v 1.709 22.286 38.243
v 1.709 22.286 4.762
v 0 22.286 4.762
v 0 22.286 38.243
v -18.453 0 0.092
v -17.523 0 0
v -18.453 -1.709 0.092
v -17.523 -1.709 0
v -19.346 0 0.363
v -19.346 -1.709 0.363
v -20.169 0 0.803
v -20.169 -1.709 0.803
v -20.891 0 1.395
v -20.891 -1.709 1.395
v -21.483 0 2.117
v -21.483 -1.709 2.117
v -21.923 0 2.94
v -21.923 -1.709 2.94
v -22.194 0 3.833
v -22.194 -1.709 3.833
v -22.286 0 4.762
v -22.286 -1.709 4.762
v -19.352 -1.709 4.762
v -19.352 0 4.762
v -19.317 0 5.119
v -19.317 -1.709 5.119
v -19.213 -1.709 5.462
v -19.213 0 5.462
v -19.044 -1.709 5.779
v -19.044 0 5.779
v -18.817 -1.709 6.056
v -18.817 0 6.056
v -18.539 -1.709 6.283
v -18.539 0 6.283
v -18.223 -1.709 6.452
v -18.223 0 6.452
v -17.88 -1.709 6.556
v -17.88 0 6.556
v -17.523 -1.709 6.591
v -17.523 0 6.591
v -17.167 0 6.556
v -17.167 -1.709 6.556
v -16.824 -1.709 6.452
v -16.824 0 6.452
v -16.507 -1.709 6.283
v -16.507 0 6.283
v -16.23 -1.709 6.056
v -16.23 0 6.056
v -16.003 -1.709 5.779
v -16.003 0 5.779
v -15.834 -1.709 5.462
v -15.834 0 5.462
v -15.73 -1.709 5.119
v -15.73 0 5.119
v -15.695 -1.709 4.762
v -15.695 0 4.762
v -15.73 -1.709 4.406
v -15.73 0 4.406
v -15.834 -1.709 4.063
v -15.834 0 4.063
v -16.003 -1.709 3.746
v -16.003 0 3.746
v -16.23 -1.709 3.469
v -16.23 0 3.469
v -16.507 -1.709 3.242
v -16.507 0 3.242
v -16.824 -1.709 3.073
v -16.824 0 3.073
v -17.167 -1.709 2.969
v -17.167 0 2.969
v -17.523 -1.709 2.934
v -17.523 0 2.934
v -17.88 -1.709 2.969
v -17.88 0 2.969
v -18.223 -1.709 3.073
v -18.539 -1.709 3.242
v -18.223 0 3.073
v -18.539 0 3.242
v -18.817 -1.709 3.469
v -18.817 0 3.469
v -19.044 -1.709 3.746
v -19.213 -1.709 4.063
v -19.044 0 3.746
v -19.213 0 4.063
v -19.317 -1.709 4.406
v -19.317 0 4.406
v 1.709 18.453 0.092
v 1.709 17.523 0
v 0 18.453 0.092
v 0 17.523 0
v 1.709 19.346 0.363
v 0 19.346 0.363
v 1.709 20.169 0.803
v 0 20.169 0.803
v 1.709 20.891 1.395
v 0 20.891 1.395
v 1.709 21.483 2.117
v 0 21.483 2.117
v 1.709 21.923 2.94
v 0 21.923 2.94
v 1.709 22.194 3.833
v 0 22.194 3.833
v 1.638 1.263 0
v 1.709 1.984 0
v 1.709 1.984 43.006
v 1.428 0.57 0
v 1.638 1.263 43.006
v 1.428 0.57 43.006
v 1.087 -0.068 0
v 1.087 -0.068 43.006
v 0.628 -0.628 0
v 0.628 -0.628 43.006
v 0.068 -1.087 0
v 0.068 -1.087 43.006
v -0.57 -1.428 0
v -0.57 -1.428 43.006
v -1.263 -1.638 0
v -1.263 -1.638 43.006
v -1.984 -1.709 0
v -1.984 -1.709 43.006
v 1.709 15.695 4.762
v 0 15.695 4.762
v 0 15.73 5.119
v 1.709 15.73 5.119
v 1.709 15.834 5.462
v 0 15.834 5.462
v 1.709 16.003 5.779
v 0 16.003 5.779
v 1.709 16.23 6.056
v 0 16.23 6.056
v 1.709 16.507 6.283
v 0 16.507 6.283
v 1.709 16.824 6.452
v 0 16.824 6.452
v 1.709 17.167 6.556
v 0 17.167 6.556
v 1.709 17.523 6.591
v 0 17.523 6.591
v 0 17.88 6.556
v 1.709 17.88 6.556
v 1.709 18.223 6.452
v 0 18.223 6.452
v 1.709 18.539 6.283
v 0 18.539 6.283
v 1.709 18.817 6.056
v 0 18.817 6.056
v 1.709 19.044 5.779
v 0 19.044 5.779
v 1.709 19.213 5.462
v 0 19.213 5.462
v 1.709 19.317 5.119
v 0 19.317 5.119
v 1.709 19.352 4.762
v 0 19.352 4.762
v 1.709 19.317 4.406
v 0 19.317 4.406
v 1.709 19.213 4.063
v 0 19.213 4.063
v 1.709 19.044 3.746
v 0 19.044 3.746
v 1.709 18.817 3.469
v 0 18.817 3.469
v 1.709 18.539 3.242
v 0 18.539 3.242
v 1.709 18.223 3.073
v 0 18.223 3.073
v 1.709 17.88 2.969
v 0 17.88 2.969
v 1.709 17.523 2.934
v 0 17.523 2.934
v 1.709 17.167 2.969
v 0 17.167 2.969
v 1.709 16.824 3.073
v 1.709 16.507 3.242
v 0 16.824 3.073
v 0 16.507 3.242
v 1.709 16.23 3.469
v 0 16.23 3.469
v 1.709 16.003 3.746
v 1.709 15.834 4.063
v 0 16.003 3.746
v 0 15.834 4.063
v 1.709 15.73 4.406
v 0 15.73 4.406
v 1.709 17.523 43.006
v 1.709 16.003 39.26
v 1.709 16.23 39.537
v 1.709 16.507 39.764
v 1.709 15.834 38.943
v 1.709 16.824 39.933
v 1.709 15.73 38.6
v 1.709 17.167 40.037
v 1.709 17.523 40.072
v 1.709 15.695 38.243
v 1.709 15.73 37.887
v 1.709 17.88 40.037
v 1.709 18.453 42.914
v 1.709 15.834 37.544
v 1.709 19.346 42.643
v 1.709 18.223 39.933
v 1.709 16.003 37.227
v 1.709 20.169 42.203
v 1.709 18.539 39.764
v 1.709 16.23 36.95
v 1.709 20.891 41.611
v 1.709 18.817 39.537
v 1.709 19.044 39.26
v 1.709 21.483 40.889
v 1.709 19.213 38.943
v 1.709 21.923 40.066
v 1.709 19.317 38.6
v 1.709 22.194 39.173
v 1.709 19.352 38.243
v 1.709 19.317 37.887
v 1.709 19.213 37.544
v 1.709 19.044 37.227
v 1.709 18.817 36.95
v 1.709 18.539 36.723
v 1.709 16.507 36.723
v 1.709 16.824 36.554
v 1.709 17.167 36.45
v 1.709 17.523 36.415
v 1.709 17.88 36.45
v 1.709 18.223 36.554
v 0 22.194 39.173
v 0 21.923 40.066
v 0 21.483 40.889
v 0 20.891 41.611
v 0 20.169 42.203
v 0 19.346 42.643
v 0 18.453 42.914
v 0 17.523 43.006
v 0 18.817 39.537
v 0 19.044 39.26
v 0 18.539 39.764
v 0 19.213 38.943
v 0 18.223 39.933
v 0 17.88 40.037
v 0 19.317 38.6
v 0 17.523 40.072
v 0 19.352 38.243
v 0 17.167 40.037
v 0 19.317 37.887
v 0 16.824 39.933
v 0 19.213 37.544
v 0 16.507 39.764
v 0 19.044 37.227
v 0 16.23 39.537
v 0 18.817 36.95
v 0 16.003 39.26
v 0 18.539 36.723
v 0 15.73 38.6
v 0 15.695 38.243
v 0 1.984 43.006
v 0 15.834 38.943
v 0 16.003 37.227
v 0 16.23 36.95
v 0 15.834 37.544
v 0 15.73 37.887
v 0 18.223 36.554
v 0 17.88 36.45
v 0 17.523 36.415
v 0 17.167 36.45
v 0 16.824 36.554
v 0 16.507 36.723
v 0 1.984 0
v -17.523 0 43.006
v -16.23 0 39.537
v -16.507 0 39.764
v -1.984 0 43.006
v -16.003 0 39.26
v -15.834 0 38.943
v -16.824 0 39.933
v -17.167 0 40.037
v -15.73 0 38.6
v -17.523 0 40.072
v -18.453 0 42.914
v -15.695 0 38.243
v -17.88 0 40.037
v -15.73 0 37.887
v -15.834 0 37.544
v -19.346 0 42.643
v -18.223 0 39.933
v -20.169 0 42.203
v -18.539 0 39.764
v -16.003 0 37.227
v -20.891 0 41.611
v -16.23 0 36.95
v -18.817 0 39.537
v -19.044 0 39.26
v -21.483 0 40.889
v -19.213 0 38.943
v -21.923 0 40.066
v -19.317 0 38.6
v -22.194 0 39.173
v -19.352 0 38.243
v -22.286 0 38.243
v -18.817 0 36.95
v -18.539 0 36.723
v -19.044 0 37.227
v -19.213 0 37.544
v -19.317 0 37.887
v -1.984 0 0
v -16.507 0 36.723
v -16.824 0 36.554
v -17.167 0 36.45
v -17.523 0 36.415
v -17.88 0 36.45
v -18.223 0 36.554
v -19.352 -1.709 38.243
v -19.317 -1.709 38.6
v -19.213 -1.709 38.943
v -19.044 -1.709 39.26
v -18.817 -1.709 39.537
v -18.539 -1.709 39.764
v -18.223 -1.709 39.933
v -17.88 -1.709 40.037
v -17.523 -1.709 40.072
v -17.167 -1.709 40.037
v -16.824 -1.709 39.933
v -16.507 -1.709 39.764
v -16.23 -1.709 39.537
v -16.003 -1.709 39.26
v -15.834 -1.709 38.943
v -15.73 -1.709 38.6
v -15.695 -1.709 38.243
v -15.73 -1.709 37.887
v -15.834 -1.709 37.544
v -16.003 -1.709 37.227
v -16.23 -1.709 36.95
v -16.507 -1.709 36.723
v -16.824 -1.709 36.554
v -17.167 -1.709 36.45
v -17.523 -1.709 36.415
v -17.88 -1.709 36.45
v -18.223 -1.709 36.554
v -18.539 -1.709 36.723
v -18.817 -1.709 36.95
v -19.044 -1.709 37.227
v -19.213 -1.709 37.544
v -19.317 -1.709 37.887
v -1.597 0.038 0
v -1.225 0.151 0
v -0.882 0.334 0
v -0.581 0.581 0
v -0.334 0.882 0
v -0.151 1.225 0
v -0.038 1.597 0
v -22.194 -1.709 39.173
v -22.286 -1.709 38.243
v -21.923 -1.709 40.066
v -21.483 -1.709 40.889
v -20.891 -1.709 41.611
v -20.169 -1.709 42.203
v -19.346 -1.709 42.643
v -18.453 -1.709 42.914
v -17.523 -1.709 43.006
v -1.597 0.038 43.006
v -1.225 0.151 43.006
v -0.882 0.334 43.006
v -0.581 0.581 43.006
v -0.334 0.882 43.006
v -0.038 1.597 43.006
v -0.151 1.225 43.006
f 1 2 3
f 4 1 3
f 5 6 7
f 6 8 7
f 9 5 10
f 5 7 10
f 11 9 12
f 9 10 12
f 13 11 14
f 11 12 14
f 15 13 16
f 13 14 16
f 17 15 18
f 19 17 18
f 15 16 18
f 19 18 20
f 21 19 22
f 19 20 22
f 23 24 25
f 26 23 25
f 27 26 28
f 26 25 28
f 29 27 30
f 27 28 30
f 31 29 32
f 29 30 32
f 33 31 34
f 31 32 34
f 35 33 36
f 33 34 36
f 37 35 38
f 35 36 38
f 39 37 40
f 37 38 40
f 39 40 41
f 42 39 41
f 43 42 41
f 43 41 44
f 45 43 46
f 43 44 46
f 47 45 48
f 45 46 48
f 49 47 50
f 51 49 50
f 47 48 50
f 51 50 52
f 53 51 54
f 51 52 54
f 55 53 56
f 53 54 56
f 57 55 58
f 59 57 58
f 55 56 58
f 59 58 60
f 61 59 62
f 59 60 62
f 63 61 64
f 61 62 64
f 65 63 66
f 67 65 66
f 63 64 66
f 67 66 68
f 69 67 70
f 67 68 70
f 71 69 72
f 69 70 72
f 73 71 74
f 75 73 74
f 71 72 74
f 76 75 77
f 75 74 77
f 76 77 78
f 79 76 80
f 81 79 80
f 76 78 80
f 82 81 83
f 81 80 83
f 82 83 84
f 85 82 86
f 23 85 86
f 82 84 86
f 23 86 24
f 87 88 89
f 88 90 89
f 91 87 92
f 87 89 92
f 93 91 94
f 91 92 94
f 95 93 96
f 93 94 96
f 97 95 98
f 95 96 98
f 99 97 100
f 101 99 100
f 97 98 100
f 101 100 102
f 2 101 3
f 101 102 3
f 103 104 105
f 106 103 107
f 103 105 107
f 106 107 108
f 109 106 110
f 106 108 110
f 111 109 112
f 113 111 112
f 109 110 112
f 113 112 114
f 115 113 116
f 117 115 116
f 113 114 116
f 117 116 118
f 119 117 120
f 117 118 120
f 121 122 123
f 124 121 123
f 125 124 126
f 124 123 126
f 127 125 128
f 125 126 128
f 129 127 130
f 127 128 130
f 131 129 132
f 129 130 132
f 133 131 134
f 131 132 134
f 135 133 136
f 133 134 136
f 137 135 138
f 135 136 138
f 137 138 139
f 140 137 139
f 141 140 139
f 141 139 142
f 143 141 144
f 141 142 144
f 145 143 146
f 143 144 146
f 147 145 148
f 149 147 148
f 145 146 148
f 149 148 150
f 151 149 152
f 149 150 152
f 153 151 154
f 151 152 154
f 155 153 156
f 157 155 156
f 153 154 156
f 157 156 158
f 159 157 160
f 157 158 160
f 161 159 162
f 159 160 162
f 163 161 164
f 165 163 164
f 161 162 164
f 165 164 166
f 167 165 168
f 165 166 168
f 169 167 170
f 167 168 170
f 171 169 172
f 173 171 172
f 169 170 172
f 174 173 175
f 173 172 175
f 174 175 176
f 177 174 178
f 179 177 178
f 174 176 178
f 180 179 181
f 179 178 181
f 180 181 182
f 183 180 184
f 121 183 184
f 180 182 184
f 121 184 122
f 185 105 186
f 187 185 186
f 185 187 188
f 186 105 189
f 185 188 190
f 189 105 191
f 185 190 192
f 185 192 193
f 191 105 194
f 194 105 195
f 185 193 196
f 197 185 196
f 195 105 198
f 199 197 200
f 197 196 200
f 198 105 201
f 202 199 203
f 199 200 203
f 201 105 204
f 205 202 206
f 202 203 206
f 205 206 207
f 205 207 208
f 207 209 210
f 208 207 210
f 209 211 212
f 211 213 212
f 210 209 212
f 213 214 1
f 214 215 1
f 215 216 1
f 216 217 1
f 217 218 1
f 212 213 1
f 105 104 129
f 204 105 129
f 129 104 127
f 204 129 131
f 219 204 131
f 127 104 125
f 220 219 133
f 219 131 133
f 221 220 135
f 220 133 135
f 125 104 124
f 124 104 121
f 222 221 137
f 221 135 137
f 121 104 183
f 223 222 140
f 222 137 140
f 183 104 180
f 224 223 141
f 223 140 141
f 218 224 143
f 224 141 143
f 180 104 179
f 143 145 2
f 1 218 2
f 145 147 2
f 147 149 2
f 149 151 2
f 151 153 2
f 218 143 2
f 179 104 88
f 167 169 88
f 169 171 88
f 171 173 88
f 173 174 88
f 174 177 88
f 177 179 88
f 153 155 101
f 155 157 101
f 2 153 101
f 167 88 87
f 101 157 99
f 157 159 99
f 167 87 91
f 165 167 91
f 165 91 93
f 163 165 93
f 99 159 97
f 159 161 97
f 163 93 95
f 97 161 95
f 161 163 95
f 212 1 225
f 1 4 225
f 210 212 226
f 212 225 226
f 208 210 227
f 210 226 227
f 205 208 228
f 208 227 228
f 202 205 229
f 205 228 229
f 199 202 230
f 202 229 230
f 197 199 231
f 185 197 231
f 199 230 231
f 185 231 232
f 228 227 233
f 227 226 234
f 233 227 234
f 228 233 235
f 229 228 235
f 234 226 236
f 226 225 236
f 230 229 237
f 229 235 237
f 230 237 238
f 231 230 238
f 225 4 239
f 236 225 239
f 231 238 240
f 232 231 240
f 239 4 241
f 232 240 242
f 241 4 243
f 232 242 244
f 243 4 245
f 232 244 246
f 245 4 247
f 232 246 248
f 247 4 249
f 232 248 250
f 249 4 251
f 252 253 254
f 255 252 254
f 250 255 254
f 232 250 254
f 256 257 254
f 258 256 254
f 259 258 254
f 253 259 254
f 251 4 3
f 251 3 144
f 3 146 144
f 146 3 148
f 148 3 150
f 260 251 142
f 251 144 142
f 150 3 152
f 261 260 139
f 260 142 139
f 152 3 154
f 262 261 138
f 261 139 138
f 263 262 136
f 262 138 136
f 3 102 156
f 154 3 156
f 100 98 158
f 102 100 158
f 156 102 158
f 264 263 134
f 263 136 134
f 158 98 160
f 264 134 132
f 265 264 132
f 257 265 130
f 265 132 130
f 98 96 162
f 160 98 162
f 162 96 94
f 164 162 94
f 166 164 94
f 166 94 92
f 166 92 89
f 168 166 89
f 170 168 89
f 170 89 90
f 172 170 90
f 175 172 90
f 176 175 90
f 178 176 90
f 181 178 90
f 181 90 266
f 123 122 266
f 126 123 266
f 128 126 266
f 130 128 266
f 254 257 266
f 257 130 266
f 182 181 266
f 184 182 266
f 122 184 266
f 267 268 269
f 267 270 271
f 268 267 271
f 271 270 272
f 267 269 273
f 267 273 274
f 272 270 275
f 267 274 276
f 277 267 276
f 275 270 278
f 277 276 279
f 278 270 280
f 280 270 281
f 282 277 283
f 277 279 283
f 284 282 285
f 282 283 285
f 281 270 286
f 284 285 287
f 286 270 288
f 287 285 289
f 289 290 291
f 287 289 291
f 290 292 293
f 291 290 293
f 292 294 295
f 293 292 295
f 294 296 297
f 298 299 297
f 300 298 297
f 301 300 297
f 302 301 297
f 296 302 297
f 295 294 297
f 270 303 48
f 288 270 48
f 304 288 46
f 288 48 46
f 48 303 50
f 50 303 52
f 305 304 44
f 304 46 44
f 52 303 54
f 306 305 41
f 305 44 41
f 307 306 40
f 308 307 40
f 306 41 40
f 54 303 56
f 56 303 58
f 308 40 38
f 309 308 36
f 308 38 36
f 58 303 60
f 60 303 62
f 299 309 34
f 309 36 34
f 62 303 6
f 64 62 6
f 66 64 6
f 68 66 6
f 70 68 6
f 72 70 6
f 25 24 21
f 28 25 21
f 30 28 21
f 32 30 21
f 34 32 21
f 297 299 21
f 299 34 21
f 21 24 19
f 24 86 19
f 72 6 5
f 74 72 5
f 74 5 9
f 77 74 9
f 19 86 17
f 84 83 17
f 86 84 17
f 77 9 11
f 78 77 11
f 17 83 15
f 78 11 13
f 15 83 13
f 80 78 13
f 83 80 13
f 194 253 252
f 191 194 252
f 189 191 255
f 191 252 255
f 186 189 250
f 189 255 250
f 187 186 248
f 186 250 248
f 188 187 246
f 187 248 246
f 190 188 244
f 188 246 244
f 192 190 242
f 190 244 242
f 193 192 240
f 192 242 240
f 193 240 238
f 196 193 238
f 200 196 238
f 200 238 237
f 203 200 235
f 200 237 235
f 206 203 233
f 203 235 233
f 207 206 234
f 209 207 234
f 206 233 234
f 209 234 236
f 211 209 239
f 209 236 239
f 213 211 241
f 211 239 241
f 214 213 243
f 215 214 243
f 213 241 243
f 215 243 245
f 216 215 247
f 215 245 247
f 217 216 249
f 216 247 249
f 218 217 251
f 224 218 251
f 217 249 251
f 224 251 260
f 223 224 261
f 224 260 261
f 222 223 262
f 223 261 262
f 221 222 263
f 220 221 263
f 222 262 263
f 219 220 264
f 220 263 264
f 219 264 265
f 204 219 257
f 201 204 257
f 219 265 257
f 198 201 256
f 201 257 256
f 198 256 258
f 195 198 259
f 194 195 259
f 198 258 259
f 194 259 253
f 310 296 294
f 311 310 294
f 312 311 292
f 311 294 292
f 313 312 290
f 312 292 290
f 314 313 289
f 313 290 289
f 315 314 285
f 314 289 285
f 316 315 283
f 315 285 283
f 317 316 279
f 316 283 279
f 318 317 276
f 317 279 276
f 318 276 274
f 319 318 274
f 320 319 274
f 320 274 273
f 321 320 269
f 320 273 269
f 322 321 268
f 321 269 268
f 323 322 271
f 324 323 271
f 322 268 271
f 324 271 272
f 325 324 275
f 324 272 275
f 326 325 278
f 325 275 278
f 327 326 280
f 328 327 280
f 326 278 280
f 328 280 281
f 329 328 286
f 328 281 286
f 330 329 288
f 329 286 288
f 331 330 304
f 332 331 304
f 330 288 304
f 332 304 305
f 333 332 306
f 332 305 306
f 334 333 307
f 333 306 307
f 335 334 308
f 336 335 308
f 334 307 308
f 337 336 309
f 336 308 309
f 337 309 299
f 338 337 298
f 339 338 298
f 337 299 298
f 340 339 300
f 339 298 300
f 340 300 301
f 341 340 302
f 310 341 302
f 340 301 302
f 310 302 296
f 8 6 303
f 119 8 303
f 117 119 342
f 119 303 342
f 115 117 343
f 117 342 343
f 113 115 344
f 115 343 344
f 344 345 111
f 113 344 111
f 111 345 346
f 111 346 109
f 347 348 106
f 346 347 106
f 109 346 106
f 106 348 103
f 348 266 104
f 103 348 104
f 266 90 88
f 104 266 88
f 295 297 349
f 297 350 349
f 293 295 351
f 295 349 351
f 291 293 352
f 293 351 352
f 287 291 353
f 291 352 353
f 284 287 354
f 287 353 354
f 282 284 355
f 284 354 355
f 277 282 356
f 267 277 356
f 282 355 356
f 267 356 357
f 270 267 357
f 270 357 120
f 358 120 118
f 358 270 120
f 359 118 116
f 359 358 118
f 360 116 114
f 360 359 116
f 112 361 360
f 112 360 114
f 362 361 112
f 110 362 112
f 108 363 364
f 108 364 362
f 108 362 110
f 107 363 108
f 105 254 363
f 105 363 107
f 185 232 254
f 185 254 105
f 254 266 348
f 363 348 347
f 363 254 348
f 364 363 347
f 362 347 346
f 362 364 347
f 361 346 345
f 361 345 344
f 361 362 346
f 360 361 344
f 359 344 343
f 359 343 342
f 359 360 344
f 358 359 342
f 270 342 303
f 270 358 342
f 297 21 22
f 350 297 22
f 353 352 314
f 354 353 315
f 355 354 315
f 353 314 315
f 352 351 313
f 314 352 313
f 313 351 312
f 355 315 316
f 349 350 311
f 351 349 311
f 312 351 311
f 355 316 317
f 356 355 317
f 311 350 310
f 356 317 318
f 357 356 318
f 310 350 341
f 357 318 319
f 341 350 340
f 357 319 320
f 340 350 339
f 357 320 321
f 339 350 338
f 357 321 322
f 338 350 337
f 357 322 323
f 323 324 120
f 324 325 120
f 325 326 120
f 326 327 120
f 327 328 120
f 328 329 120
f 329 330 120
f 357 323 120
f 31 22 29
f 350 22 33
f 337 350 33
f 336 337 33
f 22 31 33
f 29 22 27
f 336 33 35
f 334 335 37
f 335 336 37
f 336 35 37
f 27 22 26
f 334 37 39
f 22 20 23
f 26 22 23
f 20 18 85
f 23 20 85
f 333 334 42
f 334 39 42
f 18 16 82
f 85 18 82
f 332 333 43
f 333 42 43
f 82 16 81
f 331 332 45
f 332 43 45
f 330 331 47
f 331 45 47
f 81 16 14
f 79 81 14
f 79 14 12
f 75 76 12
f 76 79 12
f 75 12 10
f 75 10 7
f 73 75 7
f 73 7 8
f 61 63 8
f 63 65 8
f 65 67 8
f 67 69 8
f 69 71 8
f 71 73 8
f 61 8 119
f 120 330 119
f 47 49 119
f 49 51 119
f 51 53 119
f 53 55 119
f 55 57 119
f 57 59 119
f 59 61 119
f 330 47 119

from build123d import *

# Parameters (mm, degrees)
F1_DEPTH = 43.005985
F2_R     = 1.98374
F3_R     = 3.69316
F4_R     = 1.8288
F5_DEPTH = 1.70942
F6_R     = 1.8288
F7_DEPTH = 1.70942
F8_R     = 4.7625


with BuildPart() as f1:
    # F0 (on Top) → F1 (new body)
    with BuildSketch(Plane.XY):
        Polygon((1.70942, 22.28596), (0, 22.28596), (0, 0), (-22.28596, 0), (-22.28596, -1.70942), (1.70942, -1.70942), align=None)
    extrude(amount=F1_DEPTH)

    # F2
    f2_edges = [f1.edges().sort_by_distance(p)[0] for p in [
        (0, 0, 21.502992),
    ]]
    fillet(f2_edges, radius=F2_R)

    # F3
    f3_edges = [f1.edges().sort_by_distance(p)[0] for p in [
        (1.70942, -1.70942, 21.502992),
    ]]
    fillet(f3_edges, radius=F3_R)

    # F4 (on face) → F5 (cut, through all)
    with BuildSketch(Plane(origin=(0, 0, 0), x_dir=(0, -1, 0), z_dir=(-1, 0, 0))):
        with Locations((-17.52346, 38.243485)):
            Circle(F4_R)
        with Locations((-17.52346, 4.7625)):
            Circle(F4_R)
    extrude(amount=-F5_DEPTH, mode=Mode.SUBTRACT)

    # F6 (on face) → F7 (cut, through all)
    with BuildSketch(Plane(origin=(0, 0, 0), x_dir=(-1, 0, 0), z_dir=(0, 1, 0))):
        with Locations((17.52346, 38.243485)):
            Circle(F6_R)
        with Locations((17.52346, 4.7625)):
            Circle(F6_R)
    extrude(amount=-F7_DEPTH, mode=Mode.SUBTRACT)

    # F8
    f8_edges = [f1.edges().sort_by_distance(p)[0] for p in [
        (0.85471, 22.28596, 43.005985),
        (-22.28596, -0.85471, 43.005985),
        (-22.28596, -0.85471, 0),
        (0.85471, 22.28596, 0),
    ]]
    fillet(f8_edges, radius=F8_R)


solid = f1.part
